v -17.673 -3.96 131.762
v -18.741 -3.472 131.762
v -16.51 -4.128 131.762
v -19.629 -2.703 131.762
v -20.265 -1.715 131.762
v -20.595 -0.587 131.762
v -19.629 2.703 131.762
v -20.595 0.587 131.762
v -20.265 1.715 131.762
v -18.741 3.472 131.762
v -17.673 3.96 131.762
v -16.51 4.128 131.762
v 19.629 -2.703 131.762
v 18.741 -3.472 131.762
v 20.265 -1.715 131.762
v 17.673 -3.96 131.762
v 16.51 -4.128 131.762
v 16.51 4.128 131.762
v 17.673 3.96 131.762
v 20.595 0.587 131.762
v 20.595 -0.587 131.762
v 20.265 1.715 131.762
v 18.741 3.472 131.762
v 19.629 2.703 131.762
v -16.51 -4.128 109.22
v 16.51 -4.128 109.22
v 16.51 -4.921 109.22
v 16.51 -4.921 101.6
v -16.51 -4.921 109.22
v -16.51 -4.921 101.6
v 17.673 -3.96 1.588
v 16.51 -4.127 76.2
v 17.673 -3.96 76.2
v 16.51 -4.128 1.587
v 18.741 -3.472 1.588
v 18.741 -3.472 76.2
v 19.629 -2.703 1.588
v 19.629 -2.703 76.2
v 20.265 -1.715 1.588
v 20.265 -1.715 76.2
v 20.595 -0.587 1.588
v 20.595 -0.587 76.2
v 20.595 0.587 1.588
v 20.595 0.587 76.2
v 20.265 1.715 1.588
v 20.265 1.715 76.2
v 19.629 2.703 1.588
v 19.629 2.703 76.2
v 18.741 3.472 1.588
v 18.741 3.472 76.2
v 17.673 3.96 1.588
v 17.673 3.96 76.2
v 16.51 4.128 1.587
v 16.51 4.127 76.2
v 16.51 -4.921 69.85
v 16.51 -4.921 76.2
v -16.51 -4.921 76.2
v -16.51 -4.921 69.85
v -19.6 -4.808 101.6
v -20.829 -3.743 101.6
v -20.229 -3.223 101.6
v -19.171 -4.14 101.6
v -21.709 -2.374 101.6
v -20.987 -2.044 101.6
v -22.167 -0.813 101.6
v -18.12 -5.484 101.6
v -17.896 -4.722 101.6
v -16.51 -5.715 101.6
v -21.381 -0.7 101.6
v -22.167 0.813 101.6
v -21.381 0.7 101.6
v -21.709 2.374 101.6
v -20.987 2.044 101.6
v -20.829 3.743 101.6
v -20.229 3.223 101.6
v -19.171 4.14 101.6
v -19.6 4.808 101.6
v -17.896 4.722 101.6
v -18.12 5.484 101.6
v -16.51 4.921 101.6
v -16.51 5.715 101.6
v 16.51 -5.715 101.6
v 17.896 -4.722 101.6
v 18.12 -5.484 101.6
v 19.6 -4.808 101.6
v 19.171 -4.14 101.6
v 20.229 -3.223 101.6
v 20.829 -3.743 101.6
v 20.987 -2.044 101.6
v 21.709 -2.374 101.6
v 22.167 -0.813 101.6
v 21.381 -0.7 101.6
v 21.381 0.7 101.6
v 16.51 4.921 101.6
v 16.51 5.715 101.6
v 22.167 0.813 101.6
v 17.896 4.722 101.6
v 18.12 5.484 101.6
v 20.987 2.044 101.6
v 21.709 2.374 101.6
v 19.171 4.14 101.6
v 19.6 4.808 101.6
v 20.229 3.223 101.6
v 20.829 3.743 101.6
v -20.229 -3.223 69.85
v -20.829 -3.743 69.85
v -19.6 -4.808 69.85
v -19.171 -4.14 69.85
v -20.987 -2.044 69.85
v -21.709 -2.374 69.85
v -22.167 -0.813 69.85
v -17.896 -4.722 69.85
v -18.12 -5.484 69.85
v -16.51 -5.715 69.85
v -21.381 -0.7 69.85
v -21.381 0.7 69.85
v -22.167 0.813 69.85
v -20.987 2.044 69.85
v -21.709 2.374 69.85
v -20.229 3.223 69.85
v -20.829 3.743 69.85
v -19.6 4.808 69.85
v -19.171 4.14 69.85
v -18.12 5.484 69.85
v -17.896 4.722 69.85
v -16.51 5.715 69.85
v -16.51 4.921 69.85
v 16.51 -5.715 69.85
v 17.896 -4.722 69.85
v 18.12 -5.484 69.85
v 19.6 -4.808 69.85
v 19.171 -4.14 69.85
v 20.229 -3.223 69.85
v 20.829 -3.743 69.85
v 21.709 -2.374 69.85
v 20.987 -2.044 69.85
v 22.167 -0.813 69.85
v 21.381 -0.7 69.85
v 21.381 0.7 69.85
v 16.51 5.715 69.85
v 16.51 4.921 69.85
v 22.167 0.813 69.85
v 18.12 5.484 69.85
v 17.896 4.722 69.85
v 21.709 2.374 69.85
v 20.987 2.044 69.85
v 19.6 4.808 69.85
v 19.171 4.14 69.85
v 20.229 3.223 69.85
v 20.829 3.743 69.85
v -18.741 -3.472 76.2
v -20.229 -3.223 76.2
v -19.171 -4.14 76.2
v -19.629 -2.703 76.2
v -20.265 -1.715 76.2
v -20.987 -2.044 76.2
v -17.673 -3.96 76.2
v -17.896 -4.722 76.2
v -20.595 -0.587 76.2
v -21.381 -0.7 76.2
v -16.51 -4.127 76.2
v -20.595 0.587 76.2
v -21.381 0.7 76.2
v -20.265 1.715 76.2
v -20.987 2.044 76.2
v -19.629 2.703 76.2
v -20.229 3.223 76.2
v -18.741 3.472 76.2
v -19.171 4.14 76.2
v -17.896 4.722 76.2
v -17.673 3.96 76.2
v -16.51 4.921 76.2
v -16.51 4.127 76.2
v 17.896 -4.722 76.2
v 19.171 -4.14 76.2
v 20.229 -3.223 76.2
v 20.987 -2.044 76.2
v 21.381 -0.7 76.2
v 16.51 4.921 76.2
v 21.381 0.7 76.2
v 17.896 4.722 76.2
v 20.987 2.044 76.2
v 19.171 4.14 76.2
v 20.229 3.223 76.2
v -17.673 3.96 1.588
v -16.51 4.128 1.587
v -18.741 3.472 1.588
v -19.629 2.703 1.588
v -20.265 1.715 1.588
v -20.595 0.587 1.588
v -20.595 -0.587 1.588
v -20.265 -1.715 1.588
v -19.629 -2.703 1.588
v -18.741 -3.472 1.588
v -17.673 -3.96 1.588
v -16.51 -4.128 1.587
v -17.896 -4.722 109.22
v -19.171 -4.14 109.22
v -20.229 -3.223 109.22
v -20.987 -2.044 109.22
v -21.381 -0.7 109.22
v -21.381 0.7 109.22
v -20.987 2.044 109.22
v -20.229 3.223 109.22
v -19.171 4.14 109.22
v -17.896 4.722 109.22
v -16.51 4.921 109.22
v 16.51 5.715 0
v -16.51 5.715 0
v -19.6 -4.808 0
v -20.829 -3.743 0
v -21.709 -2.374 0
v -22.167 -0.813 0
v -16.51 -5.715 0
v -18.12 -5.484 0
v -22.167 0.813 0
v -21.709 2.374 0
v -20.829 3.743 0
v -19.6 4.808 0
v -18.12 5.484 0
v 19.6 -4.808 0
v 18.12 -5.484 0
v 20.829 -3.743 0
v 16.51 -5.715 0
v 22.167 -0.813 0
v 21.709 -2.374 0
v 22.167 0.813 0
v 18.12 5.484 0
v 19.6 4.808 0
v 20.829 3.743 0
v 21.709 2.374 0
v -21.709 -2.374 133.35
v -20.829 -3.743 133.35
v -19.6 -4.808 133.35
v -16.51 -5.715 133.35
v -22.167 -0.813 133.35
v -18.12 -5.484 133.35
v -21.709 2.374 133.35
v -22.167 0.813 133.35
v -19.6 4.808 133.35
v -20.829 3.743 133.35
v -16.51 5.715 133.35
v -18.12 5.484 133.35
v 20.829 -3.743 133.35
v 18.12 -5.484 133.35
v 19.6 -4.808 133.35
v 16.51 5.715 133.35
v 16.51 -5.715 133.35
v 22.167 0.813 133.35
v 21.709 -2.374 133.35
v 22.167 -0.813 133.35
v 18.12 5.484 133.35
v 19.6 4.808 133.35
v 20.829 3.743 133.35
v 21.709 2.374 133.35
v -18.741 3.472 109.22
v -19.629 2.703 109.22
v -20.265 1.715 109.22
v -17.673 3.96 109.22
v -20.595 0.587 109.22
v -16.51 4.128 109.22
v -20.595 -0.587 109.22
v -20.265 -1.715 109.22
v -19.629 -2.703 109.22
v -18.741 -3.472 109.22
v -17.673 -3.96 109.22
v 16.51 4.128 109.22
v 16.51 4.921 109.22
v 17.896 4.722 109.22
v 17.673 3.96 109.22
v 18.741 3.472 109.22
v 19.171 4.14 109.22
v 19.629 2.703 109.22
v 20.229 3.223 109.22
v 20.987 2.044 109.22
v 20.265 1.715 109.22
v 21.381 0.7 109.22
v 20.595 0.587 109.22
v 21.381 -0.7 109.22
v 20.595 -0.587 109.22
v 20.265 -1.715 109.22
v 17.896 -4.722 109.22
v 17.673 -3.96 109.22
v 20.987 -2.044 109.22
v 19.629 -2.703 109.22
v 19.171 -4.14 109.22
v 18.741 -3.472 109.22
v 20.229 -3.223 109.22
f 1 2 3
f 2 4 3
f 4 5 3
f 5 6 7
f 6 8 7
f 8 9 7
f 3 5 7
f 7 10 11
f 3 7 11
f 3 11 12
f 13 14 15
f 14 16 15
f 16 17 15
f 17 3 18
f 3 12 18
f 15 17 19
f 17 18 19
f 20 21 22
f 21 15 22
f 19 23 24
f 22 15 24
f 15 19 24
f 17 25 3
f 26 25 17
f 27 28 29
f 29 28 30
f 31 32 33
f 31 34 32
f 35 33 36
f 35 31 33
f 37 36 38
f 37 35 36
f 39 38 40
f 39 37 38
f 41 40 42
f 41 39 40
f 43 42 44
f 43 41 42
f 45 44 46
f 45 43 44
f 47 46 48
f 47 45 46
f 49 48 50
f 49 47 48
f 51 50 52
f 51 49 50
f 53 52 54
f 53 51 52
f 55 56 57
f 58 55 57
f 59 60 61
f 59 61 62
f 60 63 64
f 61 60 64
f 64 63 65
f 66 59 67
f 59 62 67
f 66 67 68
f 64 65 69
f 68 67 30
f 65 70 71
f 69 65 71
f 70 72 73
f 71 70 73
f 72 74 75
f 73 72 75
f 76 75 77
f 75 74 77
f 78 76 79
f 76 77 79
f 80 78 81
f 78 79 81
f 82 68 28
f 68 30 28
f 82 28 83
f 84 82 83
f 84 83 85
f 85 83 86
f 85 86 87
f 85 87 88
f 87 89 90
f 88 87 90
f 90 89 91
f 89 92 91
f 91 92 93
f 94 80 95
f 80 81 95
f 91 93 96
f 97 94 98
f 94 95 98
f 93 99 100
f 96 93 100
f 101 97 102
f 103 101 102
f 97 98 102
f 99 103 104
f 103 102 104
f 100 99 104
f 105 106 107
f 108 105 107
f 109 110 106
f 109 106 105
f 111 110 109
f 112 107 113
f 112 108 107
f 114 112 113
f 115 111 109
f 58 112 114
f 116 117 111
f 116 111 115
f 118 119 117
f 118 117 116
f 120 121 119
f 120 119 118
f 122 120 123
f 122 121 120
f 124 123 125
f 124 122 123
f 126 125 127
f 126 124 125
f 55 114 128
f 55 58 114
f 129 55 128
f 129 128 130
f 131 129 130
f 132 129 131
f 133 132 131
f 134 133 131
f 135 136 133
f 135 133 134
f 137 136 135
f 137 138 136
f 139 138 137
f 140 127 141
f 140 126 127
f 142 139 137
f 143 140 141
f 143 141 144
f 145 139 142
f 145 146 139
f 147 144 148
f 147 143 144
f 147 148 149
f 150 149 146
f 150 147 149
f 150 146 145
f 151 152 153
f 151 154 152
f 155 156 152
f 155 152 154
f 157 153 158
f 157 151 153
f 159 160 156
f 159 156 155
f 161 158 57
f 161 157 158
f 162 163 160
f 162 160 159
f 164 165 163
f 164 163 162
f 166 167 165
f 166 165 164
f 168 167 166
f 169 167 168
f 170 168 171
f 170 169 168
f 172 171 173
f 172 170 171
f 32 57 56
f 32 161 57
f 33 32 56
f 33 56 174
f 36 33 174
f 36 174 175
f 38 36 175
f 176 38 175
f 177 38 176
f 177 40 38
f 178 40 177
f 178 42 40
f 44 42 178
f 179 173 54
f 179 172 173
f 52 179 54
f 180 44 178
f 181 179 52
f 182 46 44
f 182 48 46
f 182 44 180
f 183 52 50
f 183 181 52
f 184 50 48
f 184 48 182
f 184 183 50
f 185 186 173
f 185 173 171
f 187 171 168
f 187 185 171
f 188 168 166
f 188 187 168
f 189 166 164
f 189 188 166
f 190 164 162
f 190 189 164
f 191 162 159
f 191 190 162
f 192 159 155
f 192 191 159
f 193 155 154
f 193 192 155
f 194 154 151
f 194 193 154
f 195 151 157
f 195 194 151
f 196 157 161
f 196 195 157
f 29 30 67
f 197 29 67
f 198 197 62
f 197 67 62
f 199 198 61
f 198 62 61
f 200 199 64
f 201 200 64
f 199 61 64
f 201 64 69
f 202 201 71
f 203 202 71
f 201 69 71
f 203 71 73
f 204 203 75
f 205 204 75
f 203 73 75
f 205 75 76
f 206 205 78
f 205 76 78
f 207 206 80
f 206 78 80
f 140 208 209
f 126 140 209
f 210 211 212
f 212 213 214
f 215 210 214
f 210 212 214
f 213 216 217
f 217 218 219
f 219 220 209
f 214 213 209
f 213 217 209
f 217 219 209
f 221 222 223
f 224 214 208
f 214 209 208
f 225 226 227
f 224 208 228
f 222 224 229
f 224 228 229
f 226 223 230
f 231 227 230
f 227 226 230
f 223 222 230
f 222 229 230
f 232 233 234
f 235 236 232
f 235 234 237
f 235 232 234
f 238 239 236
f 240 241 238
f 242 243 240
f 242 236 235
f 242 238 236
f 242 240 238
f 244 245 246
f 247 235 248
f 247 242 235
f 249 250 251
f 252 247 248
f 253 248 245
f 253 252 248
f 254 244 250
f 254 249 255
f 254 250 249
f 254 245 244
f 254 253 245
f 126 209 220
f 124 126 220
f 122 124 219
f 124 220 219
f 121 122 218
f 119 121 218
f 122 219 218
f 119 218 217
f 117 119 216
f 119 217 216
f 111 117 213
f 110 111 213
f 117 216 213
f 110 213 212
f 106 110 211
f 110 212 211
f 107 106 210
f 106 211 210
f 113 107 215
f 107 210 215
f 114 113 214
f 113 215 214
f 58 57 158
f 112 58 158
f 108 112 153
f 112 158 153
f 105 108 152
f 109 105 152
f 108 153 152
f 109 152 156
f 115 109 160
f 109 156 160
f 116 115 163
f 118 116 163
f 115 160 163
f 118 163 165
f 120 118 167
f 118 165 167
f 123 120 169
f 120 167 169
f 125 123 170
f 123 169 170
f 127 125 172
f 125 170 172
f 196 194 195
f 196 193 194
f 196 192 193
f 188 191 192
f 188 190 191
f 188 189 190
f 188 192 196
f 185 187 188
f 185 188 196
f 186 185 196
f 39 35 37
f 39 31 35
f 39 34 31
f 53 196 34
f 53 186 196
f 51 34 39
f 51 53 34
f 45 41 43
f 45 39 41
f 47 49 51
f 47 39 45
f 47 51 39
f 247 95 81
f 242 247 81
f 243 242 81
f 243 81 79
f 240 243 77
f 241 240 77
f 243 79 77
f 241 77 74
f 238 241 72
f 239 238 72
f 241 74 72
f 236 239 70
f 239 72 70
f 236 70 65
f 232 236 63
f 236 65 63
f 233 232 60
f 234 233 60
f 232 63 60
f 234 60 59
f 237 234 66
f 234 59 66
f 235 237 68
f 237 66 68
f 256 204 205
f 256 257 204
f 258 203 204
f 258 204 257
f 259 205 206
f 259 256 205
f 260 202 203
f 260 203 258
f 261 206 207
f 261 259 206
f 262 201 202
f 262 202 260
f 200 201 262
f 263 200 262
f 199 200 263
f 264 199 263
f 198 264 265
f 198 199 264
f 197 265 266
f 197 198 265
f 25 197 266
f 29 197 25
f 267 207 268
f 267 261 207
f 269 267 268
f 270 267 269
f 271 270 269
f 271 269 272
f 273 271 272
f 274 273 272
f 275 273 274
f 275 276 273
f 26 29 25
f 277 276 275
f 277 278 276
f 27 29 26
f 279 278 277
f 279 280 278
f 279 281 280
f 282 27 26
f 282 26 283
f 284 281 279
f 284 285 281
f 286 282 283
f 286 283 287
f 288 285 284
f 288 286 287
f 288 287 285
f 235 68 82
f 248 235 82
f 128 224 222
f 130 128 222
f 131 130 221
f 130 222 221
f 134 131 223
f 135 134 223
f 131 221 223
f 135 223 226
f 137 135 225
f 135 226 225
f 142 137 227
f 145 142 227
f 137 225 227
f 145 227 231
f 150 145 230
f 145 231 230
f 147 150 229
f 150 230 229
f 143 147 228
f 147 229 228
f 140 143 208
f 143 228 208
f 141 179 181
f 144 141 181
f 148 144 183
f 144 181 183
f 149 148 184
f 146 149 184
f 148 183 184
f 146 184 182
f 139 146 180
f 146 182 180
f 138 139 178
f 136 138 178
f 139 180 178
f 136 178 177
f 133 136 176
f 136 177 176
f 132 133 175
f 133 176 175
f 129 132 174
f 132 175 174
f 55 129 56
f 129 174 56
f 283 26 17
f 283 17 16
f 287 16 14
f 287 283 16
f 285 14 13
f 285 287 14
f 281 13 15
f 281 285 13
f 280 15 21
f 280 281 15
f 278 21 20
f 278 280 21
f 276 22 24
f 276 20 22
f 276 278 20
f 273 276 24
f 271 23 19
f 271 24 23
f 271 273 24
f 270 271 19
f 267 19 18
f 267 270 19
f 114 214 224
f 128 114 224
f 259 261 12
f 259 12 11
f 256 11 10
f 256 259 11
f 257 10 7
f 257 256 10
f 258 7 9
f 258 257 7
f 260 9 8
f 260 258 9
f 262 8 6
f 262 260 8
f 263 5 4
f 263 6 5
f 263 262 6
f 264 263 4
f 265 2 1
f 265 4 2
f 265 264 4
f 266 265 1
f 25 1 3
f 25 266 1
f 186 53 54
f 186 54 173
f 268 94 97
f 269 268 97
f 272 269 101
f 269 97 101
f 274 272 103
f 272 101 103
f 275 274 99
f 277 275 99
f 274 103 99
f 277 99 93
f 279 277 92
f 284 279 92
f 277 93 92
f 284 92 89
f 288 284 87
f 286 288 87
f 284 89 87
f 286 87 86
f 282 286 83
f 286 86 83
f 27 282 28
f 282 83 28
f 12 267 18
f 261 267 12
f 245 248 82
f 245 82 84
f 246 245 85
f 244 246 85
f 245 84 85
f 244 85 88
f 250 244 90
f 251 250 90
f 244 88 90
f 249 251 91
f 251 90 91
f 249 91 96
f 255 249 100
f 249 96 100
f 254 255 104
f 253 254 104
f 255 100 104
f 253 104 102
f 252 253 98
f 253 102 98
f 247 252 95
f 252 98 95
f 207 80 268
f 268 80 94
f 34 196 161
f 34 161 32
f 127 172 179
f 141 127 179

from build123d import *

# Parameters (mm, degrees)
F2_DEPTH  = 76.2
F3_T      = -1.5875
F5_DEPTH  = 6.35
F8_DEPTH  = 31.75
F9_T      = -1.5875
F11_DEPTH = 7.62


with BuildPart() as f2:
    # F0 (on Top) → F2 (new body)
    with BuildSketch(Plane.XY):
        with BuildLine():
            Line((16.51, 5.715), (-16.51, 5.715))
            ThreePointArc((-16.51, 5.715), (-22.225, 0), (-16.51, -5.715))
            Line((-16.51, -5.715), (16.51, -5.715))
            ThreePointArc((16.51, -5.715), (22.225, 0), (16.51, 5.715))
        make_face()
    extrude(amount=F2_DEPTH)

    # F3
    f3_openings = [f2.faces().sort_by_distance(p)[0] for p in [
        (0, 0, 76.2),
    ]]
    offset(amount=F3_T, openings=f3_openings)

    # F4 (on face) → F5 (cut)
    with BuildSketch(Plane.XY.offset(76.2)):
        with BuildLine():
            Line((16.51, 5.715), (-16.51, 5.715))
            ThreePointArc((-16.51, 5.715), (-22.225, 0), (-16.51, -5.715))
            Line((-16.51, -5.715), (16.51, -5.715))
            ThreePointArc((16.51, -5.715), (22.225, 0), (16.51, 5.715))
        make_face()
        with BuildLine():
            ThreePointArc((-16.51, -4.92125), (-21.43125, 0), (-16.51, 4.92125))
            Line((-16.51, 4.92125), (16.51, 4.92125))
            ThreePointArc((16.51, 4.92125), (21.43125, 0), (16.51, -4.92125))
            Line((16.51, -4.92125), (-16.51, -4.92125))
        make_face(mode=Mode.SUBTRACT)
    extrude(amount=-F5_DEPTH, mode=Mode.SUBTRACT)


with BuildPart() as f8:
    # F7 (on offset) → F8 (new body)
    with BuildSketch(Plane.XY.offset(101.6)):
        with BuildLine():
            Line((16.51, 5.715), (-16.51, 5.715))
            ThreePointArc((-16.51, 5.715), (-22.225, 0), (-16.51, -5.715))
            Line((-16.51, -5.715), (16.51, -5.715))
            ThreePointArc((16.51, -5.715), (22.225, 0), (16.51, 5.715))
        make_face()
    extrude(amount=F8_DEPTH)

    # F9
    f9_openings = [f8.faces().sort_by_distance(p)[0] for p in [
        (0, 0, 101.6),
    ]]
    offset(amount=F9_T, openings=f9_openings)

    # F10 (on face) → F11 (cut)
    with BuildSketch(Plane(origin=(0, 0, 101.6), x_dir=(1, 0, 0), z_dir=(0, 0, -1))):
        with BuildLine():
            Line((16.51, 4.92125), (-16.51, 4.92125))
            ThreePointArc((-16.51, 4.92125), (-21.43125, 0), (-16.51, -4.92125))
            Line((-16.51, -4.92125), (16.51, -4.92125))
            ThreePointArc((16.51, -4.92125), (21.43125, 0), (16.51, 4.92125))
        make_face()
    extrude(amount=-F11_DEPTH, mode=Mode.SUBTRACT)


solid = Compound([f2.part, f8.part])
